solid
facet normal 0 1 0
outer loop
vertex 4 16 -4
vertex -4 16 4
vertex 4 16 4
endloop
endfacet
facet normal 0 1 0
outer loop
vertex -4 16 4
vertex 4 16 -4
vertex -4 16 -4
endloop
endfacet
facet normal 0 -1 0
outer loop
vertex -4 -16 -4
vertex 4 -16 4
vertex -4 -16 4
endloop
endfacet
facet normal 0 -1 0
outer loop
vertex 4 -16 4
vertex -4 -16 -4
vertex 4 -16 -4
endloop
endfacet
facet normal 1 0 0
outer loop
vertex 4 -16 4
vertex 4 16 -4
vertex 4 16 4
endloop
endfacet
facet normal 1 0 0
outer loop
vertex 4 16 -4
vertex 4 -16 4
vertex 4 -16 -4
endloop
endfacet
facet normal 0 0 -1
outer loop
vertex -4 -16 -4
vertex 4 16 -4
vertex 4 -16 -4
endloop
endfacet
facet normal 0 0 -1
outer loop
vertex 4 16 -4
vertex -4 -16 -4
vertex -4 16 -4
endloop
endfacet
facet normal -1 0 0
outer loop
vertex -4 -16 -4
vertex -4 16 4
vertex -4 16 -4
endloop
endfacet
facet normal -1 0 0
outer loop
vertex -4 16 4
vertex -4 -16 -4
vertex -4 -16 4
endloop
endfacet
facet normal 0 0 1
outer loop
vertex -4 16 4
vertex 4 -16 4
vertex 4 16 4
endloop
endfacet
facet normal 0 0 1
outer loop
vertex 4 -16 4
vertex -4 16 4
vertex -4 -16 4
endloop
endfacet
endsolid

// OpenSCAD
size=32; //block=32 //item=8

rotate([0,90,90]){
cube([size*0.25,size*0.25,size*1],center=true);
};
